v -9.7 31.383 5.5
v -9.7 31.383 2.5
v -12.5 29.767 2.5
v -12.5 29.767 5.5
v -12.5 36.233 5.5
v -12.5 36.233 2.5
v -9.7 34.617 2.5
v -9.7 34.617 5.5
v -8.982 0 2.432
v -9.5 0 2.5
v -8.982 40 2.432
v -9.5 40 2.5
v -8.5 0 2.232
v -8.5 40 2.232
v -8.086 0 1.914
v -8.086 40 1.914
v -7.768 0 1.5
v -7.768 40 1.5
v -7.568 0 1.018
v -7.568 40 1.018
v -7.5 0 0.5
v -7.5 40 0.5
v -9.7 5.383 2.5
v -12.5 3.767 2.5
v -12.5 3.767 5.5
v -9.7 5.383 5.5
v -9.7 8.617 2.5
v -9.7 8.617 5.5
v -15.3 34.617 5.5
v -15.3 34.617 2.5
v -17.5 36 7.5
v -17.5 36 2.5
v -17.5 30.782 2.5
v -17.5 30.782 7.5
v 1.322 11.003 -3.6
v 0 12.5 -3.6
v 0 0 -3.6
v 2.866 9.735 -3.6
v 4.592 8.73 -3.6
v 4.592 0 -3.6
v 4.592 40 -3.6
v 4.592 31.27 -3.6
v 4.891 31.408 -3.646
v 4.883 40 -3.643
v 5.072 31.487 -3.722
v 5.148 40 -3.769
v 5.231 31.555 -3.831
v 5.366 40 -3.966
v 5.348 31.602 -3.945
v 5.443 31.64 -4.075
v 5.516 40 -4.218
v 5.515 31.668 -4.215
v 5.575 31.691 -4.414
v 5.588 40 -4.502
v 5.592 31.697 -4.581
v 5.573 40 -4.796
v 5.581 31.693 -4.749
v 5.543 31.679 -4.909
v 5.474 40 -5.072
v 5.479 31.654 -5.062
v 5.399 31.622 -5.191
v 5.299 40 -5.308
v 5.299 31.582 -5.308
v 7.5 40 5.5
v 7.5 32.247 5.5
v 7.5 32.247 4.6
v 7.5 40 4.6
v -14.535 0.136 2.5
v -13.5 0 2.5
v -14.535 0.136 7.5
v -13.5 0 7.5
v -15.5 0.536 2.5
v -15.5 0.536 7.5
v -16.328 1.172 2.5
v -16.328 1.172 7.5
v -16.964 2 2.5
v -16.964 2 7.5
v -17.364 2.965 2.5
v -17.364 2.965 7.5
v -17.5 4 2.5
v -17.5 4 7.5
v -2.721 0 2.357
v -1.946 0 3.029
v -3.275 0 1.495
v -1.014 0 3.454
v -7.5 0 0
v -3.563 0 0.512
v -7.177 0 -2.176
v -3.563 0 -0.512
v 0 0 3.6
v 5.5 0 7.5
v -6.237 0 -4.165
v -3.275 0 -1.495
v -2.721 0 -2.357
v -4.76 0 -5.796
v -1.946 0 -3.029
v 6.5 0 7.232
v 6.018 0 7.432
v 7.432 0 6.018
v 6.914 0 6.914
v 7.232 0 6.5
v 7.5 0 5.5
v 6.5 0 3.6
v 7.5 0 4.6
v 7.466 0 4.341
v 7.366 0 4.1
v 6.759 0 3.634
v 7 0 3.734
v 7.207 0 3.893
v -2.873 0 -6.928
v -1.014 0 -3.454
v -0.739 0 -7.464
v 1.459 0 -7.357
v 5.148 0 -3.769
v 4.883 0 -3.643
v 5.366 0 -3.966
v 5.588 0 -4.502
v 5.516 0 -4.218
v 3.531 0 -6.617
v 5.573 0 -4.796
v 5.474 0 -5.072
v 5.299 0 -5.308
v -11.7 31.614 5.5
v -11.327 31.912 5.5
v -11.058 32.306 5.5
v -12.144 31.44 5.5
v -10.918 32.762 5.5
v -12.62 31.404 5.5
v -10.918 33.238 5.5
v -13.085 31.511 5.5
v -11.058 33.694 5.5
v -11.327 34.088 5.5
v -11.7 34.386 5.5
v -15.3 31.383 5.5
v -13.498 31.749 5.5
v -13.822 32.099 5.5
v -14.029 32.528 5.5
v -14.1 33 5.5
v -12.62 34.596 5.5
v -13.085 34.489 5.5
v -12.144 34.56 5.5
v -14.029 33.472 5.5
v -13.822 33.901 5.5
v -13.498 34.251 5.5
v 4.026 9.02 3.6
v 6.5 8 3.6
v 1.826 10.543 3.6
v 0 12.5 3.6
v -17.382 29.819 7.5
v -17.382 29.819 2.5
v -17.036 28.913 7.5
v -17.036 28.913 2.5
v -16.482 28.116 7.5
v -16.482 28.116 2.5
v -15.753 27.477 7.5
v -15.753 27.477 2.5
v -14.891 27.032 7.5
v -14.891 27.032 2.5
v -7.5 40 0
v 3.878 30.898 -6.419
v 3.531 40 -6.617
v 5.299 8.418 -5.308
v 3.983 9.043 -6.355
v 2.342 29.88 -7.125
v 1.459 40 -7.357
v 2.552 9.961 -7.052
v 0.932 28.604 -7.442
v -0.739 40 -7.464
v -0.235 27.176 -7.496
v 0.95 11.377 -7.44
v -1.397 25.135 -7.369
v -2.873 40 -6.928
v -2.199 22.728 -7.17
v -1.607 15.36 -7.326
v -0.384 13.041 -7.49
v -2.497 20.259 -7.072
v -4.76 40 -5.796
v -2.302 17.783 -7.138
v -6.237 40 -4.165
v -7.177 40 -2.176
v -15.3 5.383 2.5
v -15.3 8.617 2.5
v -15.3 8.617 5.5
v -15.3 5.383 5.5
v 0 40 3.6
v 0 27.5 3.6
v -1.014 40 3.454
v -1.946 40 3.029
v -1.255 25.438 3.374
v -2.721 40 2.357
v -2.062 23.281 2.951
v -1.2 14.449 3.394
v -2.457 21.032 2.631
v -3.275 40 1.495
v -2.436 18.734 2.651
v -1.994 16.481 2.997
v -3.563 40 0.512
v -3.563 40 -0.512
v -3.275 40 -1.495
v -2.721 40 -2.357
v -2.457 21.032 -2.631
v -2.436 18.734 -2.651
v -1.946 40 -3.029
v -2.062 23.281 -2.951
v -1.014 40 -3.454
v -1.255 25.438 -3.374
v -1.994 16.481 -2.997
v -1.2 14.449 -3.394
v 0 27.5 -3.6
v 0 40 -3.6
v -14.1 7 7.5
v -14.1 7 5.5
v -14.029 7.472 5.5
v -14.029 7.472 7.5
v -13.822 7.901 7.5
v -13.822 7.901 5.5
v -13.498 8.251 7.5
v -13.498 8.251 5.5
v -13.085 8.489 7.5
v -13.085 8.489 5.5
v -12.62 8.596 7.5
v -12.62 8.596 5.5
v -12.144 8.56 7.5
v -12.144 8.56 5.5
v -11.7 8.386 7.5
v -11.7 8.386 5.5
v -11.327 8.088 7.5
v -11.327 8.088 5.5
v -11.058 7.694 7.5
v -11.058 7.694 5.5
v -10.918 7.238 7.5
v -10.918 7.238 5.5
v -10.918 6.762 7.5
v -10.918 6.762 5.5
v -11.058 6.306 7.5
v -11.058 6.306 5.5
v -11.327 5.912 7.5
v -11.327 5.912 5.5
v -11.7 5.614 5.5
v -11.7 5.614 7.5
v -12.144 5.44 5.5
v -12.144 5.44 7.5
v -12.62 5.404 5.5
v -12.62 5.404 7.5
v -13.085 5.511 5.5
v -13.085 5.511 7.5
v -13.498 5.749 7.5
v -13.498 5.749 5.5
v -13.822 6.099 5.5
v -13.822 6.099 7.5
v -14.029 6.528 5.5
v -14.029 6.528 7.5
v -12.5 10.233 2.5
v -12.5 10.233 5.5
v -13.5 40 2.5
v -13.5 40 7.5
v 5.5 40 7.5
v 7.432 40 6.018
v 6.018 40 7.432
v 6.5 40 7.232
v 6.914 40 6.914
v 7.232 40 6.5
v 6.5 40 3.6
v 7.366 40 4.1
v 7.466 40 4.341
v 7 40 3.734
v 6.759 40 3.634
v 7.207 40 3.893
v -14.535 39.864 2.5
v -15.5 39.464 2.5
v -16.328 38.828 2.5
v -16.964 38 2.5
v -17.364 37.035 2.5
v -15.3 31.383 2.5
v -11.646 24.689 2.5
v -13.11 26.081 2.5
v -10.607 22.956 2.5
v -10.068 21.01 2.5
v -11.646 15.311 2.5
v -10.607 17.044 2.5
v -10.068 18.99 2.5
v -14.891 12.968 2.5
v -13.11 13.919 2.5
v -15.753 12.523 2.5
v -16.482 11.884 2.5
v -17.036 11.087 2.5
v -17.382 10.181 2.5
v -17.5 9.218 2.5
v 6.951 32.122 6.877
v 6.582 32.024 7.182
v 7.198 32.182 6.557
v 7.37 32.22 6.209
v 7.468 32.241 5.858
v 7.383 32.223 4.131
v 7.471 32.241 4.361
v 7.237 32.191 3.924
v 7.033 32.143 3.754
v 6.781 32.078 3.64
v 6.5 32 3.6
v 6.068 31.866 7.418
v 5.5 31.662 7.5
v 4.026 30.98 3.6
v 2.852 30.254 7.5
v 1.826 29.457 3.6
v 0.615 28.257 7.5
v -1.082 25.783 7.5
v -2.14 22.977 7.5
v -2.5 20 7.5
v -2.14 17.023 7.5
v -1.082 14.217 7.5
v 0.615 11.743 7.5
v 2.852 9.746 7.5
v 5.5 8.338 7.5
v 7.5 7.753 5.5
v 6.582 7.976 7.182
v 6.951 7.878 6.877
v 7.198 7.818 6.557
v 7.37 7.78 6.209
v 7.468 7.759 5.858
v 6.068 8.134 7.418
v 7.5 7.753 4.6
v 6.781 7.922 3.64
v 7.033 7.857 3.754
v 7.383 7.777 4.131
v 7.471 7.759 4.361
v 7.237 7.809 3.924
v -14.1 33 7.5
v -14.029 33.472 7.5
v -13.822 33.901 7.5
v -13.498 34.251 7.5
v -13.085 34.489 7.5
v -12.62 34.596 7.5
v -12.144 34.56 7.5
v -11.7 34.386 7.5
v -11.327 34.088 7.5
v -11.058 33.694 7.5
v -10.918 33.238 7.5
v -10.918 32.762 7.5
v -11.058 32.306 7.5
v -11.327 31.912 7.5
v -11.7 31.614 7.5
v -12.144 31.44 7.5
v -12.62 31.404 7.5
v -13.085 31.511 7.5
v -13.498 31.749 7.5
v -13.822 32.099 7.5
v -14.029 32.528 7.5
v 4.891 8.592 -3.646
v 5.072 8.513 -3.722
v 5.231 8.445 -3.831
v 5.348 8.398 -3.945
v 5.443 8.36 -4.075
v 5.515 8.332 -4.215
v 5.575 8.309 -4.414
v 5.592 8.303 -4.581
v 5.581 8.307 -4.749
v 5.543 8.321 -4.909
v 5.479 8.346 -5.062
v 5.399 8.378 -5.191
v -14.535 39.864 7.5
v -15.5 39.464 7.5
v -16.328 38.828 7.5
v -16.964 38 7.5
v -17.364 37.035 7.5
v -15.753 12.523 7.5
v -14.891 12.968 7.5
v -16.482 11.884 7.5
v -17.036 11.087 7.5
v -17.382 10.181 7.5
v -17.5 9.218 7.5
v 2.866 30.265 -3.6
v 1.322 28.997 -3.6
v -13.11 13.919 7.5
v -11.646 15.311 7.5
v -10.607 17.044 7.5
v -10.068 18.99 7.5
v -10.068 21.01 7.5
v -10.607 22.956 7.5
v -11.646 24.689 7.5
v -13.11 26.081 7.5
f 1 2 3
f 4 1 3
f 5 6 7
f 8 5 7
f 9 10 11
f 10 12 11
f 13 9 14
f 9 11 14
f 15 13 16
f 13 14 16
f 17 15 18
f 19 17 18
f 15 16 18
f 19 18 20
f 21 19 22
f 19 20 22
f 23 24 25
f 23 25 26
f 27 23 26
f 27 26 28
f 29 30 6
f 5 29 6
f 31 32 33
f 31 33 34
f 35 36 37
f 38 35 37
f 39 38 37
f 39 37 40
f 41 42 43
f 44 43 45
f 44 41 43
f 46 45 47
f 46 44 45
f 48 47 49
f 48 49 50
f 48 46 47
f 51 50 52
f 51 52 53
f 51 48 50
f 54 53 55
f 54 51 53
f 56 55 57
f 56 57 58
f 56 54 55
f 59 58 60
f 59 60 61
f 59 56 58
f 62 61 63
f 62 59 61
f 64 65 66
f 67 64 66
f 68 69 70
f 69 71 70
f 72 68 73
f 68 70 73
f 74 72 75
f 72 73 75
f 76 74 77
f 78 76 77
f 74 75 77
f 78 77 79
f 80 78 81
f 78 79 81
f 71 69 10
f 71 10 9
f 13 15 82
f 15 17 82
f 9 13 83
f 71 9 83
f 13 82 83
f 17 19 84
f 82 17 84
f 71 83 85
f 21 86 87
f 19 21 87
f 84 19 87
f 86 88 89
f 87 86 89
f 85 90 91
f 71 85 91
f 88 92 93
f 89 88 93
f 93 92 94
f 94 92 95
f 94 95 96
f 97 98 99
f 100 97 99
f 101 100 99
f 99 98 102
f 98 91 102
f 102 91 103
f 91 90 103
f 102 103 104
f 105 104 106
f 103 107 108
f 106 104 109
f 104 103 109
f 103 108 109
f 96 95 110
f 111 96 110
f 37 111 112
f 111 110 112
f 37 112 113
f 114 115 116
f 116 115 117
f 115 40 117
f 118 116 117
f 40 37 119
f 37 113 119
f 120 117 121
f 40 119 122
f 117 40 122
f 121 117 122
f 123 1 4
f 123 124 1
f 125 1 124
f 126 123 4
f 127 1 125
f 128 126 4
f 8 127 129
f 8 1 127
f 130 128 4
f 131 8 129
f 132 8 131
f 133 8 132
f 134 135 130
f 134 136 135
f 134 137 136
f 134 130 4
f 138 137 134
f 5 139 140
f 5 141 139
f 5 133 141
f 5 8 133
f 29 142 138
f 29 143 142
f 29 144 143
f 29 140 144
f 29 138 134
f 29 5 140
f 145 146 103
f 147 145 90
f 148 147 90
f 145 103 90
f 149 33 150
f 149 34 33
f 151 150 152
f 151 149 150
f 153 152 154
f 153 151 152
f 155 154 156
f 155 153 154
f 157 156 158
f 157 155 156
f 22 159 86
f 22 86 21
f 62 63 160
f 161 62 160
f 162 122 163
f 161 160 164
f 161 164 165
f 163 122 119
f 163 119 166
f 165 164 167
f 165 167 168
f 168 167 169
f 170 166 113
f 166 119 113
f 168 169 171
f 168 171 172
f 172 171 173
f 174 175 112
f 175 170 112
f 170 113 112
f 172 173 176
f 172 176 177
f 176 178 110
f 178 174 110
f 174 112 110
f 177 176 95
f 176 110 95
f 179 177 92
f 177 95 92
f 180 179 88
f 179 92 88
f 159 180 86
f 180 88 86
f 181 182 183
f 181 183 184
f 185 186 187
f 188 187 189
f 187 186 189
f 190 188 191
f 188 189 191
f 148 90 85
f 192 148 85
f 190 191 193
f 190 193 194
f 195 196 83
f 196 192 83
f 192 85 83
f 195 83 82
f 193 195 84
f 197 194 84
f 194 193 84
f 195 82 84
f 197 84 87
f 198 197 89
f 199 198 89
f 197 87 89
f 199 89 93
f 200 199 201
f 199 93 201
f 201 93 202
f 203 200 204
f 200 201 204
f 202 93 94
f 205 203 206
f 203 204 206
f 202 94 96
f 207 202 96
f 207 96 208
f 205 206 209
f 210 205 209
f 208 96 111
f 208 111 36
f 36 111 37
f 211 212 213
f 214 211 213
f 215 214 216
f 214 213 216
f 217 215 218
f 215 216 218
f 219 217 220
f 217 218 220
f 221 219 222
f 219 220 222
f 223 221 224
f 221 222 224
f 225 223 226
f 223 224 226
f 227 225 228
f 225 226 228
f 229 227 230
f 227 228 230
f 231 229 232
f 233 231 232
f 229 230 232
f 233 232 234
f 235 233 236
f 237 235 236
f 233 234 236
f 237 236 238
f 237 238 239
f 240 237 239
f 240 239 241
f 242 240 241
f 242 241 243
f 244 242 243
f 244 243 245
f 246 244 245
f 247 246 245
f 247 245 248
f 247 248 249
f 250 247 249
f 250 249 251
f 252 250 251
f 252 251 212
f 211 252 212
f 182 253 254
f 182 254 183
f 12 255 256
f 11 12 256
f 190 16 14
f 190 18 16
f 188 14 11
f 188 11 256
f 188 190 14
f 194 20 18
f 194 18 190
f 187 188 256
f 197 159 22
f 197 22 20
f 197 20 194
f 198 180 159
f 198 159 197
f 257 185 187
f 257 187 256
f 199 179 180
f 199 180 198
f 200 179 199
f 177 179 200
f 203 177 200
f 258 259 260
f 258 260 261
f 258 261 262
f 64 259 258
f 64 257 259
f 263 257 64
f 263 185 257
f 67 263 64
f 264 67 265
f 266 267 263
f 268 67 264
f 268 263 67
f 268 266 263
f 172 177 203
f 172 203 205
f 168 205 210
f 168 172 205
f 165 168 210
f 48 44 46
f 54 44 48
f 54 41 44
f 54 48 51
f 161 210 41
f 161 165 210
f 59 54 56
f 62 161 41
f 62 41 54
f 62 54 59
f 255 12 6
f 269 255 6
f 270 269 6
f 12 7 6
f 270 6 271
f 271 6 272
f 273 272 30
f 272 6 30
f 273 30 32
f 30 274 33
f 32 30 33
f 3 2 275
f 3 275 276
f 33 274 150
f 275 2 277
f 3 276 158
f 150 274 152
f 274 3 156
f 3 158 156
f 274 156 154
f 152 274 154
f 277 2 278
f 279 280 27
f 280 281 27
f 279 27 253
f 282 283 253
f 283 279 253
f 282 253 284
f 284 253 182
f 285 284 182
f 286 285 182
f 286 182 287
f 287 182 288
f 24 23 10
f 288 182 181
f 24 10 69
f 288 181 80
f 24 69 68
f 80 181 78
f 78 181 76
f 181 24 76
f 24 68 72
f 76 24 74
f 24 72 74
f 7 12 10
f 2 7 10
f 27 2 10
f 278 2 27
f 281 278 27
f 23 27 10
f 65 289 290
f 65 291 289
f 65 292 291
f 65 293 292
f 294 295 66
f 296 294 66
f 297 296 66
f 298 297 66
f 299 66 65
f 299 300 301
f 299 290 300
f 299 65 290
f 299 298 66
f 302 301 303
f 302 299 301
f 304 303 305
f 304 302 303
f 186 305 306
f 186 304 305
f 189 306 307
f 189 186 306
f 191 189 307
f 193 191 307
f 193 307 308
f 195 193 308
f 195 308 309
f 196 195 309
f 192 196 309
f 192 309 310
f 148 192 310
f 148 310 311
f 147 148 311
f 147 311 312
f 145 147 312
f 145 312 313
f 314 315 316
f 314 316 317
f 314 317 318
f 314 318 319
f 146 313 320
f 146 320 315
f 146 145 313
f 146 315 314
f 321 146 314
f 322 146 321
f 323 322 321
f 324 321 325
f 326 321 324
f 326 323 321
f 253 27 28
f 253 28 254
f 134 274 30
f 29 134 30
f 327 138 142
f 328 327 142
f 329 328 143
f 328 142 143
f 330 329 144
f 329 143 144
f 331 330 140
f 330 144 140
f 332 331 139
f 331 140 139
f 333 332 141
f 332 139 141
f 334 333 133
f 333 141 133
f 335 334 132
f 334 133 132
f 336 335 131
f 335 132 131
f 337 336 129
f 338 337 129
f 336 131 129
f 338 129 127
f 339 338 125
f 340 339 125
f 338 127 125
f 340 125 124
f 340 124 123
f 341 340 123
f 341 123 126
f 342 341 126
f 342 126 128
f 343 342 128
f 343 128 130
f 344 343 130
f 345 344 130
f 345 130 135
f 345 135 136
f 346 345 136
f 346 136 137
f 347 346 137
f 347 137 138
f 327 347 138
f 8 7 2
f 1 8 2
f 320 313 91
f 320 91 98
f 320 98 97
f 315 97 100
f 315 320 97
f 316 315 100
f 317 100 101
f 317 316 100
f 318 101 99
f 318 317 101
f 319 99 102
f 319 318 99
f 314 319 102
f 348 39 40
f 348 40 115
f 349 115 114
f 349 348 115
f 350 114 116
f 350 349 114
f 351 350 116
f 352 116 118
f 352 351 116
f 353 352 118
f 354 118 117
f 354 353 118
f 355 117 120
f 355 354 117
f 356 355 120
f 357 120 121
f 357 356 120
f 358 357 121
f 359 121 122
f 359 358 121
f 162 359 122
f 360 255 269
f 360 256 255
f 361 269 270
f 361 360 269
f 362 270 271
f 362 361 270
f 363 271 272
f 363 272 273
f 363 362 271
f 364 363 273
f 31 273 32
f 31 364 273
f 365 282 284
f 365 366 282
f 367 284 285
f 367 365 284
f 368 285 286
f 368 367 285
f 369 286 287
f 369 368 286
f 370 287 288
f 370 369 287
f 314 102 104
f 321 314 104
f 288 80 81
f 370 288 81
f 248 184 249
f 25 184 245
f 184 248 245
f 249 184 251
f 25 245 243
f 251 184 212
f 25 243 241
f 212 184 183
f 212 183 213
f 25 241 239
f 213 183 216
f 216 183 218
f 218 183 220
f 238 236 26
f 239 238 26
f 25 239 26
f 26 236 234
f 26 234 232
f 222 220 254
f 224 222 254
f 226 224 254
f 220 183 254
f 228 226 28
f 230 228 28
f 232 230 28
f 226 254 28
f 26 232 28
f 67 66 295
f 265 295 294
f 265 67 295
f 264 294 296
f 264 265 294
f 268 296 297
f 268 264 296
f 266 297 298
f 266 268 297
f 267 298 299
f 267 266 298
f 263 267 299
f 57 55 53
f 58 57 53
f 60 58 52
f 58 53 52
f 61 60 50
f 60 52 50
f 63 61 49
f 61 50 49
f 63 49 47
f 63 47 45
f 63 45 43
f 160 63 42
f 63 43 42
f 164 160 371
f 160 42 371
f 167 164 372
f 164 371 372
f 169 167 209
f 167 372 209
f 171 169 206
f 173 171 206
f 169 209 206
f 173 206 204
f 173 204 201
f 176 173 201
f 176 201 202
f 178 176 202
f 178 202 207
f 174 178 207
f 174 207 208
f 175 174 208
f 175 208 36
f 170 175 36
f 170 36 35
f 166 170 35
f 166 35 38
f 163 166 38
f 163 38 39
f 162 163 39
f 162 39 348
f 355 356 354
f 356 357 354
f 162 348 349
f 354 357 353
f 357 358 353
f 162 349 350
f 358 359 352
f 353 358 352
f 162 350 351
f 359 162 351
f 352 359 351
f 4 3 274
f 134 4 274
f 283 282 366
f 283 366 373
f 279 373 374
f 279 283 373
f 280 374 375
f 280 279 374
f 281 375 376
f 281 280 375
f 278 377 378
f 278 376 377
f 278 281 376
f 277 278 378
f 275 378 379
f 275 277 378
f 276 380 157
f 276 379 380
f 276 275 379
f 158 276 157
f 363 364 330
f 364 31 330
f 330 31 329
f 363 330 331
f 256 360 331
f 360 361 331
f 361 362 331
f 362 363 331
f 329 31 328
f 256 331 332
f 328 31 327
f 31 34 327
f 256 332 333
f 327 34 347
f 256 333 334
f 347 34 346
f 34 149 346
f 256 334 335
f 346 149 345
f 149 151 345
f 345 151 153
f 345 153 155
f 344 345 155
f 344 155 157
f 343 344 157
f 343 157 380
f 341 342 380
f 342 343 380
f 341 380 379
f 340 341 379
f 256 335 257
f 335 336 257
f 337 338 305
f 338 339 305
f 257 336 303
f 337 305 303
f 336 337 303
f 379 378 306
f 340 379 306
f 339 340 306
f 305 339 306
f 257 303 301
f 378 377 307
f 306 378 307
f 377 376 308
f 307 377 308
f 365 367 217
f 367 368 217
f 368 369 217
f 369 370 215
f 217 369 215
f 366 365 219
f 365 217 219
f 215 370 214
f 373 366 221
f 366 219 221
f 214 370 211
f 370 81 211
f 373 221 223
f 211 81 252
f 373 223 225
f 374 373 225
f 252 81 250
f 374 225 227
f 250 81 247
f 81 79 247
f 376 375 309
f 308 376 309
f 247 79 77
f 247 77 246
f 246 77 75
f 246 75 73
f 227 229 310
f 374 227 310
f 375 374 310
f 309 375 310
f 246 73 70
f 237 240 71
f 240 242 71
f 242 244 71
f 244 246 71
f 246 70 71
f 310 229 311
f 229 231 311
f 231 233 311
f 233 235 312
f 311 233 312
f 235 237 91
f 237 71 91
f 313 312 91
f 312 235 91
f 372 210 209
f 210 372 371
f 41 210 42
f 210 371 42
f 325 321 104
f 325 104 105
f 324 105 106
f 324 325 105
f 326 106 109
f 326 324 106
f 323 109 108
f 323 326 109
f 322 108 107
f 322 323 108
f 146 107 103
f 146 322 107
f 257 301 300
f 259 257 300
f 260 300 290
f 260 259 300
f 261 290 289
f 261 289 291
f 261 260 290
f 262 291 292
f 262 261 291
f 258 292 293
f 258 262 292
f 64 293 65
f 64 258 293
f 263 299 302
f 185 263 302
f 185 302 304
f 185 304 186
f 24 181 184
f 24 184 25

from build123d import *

# Parameters (mm, degrees)
SALIENTE_EXTRUIR1_DEPTH    = 40
CROQUIS2_R                 = 1.6
CORTAR_EXTRUIR1_DEPTH      = 6
CORTAR_EXTRUIR2_DEPTH      = 3
CORTAR_EXTRUIR3_DEPTH      = 6
REDONDEO1_R                = 4
REDONDEO2_R                = 2
REDONDEO3_R                = 1
CROQUIS5_R                 = 12.5
CORTAR_EXTRUIR4_DEPTH      = 8.5
CORTAR_EXTRUIR4_DEPTH_BACK = 8.5


with BuildPart() as part:
    # Croquis1 → Saliente-Extruir1 (new body)
    with BuildSketch(Plane(origin=(0, 0, 0), x_dir=(1, 0, 0), z_dir=(0, 1, 0))):
        with BuildLine():
            Line((-17.5, -7.5), (7.5, -7.5))
            Line((7.5, -7.5), (7.5, -3.6))
            Line((7.5, -3.6), (0, -3.6))
            ThreePointArc((0, -3.6), (-3.6, 0), (0, 3.6))
            Line((0, 3.6), (6.57951366, 3.6))
            ThreePointArc((6.57951366, 3.6), (-1.857908441, 7.266235354), (-7.5, 0))
            Line((-7.5, 0), (-7.5, -2.5))
            Line((-7.5, -2.5), (-17.5, -2.5))
            Line((-17.5, -2.5), (-17.5, -7.5))
        make_face()
    extrude(amount=SALIENTE_EXTRUIR1_DEPTH)

    # Croquis2 → Cortar-Extruir1 (cut, through all)
    with BuildSketch(Plane(origin=(0, 0, 2.5), x_dir=(-1, 0, 0), z_dir=(0, 0, -1))):
        with Locations((12.5, 7)):
            Circle(CROQUIS2_R)
        with Locations((12.5, 33)):
            Circle(CROQUIS2_R)
    extrude(amount=-CORTAR_EXTRUIR1_DEPTH, mode=Mode.SUBTRACT)

    # Croquis3 → Cortar-Extruir2 (cut)
    with BuildSketch(Plane(origin=(0, 0, 2.5), x_dir=(-1, 0, 0), z_dir=(0, 0, -1))):
        Polygon((15.3, 31.383419246), (15.3, 34.616580754), (12.5, 36.233161507), (9.7, 34.616580754), (9.7, 31.383419246), (12.5, 29.766838493), align=None)
        Polygon((12.5, 10.233161507), (15.3, 8.616580754), (15.3, 5.383419246), (12.5, 3.766838493), (9.7, 5.383419246), (9.7, 8.616580754), align=None)
    extrude(amount=-CORTAR_EXTRUIR2_DEPTH, mode=Mode.SUBTRACT)

    # Croquis4 → Cortar-Extruir3 (cut, through all)
    with BuildSketch(Plane(origin=(0, 0, 2.5), x_dir=(-1, 0, 0), z_dir=(0, 0, -1))):
        with BuildLine():
            Line((17.5, 27.5), (17.5, 12.5))
            ThreePointArc((17.5, 12.5), (10, 20), (17.5, 27.5))
        make_face()
    extrude(amount=-CORTAR_EXTRUIR3_DEPTH, mode=Mode.SUBTRACT)

    # Redondeo1
    redondeo1_edges = [part.edges().sort_by_distance(p)[0] for p in [
        (-17.5, 40, 5),
        (-17.5, 12.5, 5),
        (-17.5, 27.5, 5),
        (-17.5, 0, 5),
    ]]
    fillet(redondeo1_edges, radius=REDONDEO1_R)

    # Redondeo2
    redondeo2_edges = [part.edges().sort_by_distance(p)[0] for p in [
        (7.5, 20, 7.5),
        (-7.5, 20, 2.5),
    ]]
    fillet(redondeo2_edges, radius=REDONDEO2_R)

    # Redondeo3
    redondeo3_edges = [part.edges().sort_by_distance(p)[0] for p in [
        (7.5, 20, 3.6),
        (6.57951366, 20, -3.6),
    ]]
    fillet(redondeo3_edges, radius=REDONDEO3_R)

    # Croquis5 → Cortar-Extruir4 (cut, two sides)
    with BuildSketch(Plane.XY) as cortar_extruir4_sk:
        with Locations((10, 20)):
            Circle(CROQUIS5_R)
    extrude(amount=CORTAR_EXTRUIR4_DEPTH, mode=Mode.SUBTRACT)
    extrude(cortar_extruir4_sk.sketch, amount=-CORTAR_EXTRUIR4_DEPTH_BACK, mode=Mode.SUBTRACT)


solid = part.part
